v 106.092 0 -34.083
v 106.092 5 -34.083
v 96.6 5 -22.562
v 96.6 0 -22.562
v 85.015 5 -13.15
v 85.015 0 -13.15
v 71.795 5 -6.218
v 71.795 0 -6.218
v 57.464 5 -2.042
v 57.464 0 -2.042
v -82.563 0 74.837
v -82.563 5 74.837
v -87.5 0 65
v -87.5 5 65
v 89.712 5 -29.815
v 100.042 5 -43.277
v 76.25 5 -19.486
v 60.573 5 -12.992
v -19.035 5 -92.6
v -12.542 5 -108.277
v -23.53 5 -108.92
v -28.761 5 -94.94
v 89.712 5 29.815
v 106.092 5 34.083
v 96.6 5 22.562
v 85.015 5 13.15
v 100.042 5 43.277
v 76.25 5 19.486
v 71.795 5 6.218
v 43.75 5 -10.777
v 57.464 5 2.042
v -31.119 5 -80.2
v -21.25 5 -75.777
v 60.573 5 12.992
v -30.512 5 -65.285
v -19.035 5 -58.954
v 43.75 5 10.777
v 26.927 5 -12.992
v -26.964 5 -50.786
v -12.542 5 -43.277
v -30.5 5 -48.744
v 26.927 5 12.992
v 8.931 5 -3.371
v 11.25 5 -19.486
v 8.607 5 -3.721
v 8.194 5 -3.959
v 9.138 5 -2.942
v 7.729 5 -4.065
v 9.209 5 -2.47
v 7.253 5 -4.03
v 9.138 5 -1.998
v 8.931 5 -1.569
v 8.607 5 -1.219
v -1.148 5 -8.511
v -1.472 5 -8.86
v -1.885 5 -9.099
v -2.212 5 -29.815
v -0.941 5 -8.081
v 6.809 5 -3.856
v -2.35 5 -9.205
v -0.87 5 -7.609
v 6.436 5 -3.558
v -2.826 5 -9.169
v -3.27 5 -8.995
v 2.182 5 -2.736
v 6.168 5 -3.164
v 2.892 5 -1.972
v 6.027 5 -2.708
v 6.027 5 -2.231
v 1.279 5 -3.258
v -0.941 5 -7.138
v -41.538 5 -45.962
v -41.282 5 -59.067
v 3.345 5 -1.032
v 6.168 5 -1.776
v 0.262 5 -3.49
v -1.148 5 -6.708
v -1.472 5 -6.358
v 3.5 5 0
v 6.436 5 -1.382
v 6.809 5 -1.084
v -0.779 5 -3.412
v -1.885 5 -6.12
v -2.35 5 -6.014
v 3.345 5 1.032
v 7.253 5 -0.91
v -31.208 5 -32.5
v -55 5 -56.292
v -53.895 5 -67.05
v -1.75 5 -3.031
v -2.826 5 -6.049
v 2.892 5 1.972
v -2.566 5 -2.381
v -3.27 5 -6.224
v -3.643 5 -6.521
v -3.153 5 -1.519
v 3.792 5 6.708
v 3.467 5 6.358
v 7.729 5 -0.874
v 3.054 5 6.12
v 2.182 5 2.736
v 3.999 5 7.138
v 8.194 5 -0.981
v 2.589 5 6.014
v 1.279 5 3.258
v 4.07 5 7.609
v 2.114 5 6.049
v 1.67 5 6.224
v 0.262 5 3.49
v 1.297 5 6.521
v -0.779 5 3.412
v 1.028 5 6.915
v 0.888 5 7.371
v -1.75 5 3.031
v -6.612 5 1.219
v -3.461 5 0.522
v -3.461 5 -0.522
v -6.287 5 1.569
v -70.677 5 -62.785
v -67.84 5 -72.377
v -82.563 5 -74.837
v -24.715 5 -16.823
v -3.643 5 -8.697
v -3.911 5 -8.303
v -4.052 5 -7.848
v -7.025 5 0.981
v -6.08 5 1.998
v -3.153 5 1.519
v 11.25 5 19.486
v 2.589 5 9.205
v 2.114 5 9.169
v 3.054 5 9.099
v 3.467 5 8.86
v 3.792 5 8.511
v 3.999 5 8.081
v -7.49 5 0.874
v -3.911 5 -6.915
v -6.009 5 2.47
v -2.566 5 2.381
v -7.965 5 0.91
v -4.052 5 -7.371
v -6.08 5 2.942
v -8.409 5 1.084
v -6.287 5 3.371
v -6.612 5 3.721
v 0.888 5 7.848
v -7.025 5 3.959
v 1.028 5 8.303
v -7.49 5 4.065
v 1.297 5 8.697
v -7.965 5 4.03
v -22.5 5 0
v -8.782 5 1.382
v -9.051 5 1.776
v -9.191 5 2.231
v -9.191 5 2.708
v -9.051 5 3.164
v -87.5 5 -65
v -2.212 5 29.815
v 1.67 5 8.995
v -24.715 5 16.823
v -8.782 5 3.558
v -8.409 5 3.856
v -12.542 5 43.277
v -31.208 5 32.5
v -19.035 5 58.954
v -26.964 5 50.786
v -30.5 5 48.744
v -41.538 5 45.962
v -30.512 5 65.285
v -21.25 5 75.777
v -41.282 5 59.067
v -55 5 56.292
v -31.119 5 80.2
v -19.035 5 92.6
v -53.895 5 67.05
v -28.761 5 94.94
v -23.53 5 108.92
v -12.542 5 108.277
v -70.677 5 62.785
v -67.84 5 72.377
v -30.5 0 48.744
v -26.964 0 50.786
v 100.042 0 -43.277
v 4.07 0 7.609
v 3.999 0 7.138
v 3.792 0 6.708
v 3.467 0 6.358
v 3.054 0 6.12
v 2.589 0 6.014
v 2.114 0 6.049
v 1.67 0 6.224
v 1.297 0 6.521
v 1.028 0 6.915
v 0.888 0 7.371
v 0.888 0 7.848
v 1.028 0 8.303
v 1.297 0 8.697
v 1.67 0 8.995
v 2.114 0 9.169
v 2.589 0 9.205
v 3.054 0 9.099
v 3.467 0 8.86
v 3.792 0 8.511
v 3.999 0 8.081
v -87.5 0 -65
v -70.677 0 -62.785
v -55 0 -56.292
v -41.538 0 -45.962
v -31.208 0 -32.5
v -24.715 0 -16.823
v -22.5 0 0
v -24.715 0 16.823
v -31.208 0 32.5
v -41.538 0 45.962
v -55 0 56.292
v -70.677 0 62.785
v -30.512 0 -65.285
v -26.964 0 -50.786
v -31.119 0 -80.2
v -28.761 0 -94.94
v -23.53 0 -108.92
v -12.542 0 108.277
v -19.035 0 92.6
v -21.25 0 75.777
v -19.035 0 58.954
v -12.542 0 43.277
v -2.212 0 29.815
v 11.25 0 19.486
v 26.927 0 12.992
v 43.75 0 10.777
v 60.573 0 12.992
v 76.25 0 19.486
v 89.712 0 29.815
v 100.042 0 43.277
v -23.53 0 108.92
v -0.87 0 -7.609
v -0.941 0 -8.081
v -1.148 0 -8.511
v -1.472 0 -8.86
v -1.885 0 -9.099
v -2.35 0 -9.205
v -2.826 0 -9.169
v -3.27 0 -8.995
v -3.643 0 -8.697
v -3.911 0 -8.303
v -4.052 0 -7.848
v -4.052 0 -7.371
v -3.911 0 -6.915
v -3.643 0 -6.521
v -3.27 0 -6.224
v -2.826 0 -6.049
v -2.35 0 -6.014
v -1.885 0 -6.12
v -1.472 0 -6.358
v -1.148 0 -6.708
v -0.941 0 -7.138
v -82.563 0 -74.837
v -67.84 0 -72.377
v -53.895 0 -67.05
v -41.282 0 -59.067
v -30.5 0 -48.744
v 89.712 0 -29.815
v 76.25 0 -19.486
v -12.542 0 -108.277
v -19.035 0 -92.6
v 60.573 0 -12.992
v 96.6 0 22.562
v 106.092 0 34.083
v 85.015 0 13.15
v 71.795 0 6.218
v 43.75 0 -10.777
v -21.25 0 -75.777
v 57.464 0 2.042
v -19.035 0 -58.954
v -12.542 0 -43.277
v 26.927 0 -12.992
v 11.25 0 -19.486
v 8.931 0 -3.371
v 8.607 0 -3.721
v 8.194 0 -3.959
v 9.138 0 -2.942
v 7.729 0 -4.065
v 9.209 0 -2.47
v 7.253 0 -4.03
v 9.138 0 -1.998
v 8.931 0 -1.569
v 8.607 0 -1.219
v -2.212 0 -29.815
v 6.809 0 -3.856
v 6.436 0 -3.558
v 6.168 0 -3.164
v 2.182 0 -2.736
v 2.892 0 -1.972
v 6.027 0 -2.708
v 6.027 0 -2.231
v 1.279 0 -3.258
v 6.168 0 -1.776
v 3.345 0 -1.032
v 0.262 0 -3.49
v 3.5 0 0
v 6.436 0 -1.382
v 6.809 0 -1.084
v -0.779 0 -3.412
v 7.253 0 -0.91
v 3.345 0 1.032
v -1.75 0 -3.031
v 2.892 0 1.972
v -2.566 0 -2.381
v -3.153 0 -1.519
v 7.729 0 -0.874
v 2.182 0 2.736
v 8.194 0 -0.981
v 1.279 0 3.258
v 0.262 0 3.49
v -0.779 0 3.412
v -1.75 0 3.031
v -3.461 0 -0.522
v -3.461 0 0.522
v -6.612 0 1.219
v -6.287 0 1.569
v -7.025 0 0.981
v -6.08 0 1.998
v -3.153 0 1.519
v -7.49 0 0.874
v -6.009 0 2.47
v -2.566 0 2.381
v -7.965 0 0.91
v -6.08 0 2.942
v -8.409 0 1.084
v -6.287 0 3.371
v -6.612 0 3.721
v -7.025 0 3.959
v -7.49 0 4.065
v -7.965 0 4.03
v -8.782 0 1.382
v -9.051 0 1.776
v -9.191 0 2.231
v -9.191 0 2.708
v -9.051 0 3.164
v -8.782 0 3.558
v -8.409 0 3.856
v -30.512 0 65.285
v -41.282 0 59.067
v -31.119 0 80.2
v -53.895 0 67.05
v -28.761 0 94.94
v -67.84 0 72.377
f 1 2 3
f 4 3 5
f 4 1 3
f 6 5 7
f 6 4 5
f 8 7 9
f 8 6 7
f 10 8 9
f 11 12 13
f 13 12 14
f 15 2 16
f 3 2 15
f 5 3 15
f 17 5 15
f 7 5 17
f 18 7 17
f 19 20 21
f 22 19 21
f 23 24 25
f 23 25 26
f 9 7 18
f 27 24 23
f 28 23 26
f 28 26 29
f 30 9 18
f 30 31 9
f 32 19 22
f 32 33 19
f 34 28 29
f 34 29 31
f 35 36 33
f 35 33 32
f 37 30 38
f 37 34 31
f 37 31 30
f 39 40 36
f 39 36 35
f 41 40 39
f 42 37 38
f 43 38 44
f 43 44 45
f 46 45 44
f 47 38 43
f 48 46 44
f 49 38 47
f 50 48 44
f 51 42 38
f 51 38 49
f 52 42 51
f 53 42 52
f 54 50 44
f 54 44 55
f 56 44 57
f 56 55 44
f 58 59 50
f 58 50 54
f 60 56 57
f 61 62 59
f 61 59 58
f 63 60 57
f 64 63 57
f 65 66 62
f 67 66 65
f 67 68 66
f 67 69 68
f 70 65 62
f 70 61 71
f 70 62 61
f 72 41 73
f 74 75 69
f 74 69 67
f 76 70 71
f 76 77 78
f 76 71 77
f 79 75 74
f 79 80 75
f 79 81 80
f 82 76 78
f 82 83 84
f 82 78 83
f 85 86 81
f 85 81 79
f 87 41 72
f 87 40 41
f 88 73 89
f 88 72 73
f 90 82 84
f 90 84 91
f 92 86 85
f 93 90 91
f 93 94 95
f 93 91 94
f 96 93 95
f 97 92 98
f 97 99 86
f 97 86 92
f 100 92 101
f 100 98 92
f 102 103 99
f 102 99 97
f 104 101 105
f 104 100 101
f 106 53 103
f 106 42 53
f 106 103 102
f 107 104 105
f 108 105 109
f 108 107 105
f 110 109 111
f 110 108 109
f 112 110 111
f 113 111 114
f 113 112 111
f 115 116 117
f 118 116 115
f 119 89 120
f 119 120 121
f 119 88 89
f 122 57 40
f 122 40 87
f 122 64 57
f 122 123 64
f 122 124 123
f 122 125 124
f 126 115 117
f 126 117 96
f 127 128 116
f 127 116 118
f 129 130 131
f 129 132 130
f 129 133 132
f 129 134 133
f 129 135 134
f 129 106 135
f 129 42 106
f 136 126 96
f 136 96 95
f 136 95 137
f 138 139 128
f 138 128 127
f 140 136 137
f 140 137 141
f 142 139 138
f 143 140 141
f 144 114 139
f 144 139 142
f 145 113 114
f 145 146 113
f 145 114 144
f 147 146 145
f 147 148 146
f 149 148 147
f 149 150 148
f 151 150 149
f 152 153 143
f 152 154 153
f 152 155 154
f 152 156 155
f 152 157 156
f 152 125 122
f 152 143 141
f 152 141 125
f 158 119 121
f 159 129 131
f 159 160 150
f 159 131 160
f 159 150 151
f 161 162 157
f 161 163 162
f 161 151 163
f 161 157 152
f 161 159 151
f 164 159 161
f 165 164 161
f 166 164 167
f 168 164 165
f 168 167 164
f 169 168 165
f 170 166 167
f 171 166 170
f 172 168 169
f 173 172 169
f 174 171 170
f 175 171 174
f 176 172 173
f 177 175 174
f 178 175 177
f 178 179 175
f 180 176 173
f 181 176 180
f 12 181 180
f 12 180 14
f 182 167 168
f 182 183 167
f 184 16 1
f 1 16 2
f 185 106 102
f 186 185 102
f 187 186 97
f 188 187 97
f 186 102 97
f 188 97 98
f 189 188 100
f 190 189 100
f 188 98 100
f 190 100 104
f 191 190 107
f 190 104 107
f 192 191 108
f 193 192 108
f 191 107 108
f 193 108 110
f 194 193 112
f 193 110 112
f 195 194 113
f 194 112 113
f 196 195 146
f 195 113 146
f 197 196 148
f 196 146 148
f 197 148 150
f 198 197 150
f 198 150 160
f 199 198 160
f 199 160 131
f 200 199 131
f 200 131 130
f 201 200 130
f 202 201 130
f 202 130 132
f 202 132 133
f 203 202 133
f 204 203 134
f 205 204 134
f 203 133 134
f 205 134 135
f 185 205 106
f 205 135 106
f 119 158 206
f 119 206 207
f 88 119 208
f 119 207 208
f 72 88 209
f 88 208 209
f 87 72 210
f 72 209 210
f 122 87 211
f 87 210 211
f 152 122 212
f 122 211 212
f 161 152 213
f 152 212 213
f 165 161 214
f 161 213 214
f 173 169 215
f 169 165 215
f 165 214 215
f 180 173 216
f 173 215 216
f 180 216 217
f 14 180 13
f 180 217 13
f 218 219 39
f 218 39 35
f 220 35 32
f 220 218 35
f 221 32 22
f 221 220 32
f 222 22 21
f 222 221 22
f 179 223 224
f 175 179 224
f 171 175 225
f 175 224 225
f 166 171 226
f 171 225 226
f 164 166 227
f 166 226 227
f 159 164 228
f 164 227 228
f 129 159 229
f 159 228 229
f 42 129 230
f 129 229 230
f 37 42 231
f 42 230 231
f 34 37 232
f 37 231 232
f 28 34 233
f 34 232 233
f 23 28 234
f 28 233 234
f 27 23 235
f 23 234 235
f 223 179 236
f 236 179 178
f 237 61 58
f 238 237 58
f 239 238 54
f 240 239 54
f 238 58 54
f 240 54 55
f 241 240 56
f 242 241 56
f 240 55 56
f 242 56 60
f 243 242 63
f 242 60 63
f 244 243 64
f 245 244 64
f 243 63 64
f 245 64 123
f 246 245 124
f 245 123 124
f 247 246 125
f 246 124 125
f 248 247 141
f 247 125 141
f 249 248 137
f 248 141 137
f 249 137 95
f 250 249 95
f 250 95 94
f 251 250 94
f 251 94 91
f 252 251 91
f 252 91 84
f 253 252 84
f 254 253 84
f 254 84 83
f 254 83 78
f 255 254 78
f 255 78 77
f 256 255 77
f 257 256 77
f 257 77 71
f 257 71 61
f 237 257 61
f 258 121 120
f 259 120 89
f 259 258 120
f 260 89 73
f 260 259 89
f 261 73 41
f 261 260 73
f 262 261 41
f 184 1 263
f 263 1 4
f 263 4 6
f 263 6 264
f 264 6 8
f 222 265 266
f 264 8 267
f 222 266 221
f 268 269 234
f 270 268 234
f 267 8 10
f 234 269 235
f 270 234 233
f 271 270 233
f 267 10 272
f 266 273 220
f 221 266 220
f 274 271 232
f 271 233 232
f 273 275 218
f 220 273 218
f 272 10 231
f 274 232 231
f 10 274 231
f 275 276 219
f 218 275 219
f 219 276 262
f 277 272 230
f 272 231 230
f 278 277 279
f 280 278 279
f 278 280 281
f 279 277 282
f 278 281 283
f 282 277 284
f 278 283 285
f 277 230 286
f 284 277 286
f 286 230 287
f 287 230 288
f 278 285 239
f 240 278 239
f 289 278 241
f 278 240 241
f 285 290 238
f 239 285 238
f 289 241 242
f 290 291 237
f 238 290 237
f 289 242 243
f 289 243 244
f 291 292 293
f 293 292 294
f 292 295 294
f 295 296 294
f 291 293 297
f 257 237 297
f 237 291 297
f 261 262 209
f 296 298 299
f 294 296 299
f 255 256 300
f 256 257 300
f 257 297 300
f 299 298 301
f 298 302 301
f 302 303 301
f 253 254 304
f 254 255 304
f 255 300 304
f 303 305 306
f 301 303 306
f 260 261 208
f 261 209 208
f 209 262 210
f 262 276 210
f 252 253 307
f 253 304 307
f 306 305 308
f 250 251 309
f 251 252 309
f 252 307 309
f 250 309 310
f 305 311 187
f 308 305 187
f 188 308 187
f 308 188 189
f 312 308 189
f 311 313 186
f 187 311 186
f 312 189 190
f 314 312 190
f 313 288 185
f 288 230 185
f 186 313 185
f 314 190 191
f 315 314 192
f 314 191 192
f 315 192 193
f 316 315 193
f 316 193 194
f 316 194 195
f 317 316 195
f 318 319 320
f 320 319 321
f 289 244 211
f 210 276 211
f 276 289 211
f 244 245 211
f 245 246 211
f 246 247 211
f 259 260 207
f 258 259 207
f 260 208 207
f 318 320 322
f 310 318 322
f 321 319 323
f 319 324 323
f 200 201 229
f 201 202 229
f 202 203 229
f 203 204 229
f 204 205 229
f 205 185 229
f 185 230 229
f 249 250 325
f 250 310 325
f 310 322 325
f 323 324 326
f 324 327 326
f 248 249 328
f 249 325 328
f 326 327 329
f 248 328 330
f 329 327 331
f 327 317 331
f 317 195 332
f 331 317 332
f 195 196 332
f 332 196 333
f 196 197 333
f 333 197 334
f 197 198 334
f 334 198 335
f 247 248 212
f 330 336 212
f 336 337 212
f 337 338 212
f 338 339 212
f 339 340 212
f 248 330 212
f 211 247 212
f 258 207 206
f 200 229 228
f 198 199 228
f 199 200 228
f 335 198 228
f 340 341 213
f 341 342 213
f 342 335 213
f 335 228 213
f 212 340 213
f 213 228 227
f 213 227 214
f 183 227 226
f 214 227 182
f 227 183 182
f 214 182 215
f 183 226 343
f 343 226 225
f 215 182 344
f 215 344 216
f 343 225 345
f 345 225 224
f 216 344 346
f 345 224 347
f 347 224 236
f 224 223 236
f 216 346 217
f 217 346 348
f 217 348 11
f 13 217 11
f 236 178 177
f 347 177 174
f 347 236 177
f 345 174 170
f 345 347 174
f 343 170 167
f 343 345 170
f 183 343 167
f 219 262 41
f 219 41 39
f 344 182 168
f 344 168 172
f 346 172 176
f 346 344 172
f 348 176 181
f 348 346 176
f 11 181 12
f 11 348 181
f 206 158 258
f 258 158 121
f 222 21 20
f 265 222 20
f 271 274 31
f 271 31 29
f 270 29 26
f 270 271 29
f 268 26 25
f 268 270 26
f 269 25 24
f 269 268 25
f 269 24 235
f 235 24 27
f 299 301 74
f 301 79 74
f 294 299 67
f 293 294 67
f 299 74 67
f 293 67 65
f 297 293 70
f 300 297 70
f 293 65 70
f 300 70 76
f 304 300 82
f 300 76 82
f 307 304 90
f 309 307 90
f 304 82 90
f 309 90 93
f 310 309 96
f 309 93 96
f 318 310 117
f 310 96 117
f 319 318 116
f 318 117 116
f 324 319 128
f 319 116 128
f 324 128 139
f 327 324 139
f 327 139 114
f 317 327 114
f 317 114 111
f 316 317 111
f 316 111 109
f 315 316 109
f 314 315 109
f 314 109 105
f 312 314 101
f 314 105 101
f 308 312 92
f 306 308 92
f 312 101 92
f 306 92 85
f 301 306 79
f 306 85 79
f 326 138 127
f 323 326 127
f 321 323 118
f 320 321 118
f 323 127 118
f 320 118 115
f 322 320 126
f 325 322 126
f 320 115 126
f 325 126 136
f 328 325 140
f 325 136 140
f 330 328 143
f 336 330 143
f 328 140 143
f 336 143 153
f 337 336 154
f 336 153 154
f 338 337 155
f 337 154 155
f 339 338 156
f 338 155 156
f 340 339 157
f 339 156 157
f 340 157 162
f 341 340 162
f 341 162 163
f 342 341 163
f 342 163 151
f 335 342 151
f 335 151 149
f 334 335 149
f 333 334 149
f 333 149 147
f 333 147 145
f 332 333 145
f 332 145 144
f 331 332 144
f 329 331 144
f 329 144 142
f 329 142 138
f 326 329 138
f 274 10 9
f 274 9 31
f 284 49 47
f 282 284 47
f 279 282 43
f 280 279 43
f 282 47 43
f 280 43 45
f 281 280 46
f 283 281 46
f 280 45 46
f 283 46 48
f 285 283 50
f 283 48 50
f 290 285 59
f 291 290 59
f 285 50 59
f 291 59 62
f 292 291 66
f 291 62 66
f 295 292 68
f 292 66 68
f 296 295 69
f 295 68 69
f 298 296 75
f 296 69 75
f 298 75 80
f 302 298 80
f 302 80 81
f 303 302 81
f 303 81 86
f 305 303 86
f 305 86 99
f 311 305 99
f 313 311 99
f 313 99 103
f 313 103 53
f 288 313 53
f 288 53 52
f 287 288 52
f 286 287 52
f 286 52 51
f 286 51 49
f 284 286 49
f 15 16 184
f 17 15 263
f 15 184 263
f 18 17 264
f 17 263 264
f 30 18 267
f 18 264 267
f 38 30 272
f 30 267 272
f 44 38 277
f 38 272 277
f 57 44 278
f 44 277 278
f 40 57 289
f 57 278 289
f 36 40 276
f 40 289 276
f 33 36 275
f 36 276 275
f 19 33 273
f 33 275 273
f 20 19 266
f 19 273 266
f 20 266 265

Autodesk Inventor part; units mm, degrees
ref_plane "YZ Plane" through (0, 0, 0) normal (1, 0, 0) x (0, 1, 0)
ref_plane "XZ Plane" through (0, 0, 0) normal (0, 1, 0) x (-1, 0, 0)
ref_plane "XY Plane" through (0, 0, 0) normal (0, 0, 1) x (1, 0, 0)
sketch "Эскиз1" plane through (0, 0, 0) normal (0, 1, 0) x (-1, 0, 0)
  circle A0 centre (0, 0) radius 152.5
  line L0 (0, 0) -> (152.5, 0)
  circle A1 centre (87.5, 0) radius 65
  circle A2 centre (-43.75, 75.7772) radius 65
  circle A3 centre (-43.75, -75.7772) radius 65
  circle A4 centre (87.5, 0) radius 75
  circle A5 centre (-43.75, 75.7772) radius 75
  circle A6 centre (-43.75, -75.7772) radius 75
  line L1 (0, 0) -> (-76.25, 132.0689)
  line L2 (0, 0) -> (-76.25, -132.0689)
  line L3 (144.5, 48.7442) -> (30.5, -48.7442)
  line L4 (-114.4637, 100.7686) -> (26.9637, 50.7859)
  line L5 (-30.0363, -149.5128) -> (-57.4637, -2.0417)
  line L6 (30.5, -48.7442) -> (26.9637, -50.7859)
  line L7 (26.9637, 50.7859) -> (30.5, 48.7442)
  line L8 (-57.4637, -2.0417) -> (-57.4637, 2.0417)
  line L9 (87.5, -75) -> (87.5, 75)
  line L10 (21.2019, 113.2772) -> (-108.7019, 38.2772)
  line L11 (-108.7019, -38.2772) -> (21.2019, -113.2772)
  point P0 (14.0693, 24.3687)
  point P1 (-28.1386, 0)
  point P2 (14.0693, -24.3687)
  point P3 (12.5, 0)
  point P4 (22.5, 0)
  point P5 (152.5, 0)
  point P6 (-6.25, 10.8253)
  point P7 (-11.25, 19.4856)
  point P8 (-76.25, 132.0689)
  point P9 (-114.4637, 100.7686)
  point P10 (-6.25, -10.8253)
  point P11 (-11.25, -19.4856)
  point P12 (-76.25, -132.0689)
  point P13 (-30.0363, -149.5128)
  point P14 (-114.4637, -100.7686)
  point P15 (-30.0363, 149.5128)
  point P16 (144.5, -48.7442)
  point P17 (152.5, 0)
  point P18 (136.9, 42.245)
  point P19 (17.5352, 54.1181)
  point P20 (-105.0352, 97.4364)
  point P21 (-114.4637, 100.7686)
  point P22 (-57.4637, -2.0417)
  point P23 (-55.6352, -11.8731)
  point P24 (-31.8648, -139.6814)
  point P25 (-30.0363, -149.5128)
  point P26 (38.1, -42.245)
  point P27 (87.5, -65)
  point P28 (87.5, 65)
  point P29 (12.5417, 108.2772)
  point P30 (-100.0417, 43.2772)
  point P31 (-57.4637, -2.0417)
  point P32 (-100.0417, -43.2772)
  point P33 (12.5417, -108.2772)
  dimension "d0" = 305
  dimension "d1" = 130
  dimension "d2" = 0
  dimension "d5" = 360
  dimension "d7" = 150
  dimension "d10" = 360
  dimension "d16" = 360
  dimension "d18" = 0
  dimension "d21" = 360
  dimension "d25" = 360
  dimension "d48" = 360
extrude "Выдавливание1" add sketch "Эскиз1" along normal blind 5 contours L9 A4 L3 A1 | L9 A1 L0 A4 | A1 L3 A4 L0 | A5 L4 A2 L10 | A4 L0 L1 A5 L7 | L11 A3 L2 A6 | L6 A6 L2 L0 A4 | L10 A2 L1 A5 | A5 L1 A2 L4 | L11 A6 L5 A3 | L2 A6 L8 A5 L1 | L5 A6 L2 A3 picked at (58.9785, -61.9188) picked at (22.0957, 93.4205) picked at (-83.1125, -20.1174)
sketch "Эскиз4" plane through (0, 5, 0) normal (0, 1, 0) x (1, 0, 0)
  circle A0 centre (0, 0) radius 3.5
  dimension "d43" = 7
extrude "Выдавливание4" cut sketch "Эскиз4" against normal blind 140
sketch "Эскиз5" plane through (0, 5, 0) normal (0, 1, 0) x (1, 0, 0)
  circle A0 centre (0, 0) radius 3.5 projected
  arc A1 (-87.5, -65) -> (-87.5, 65) centre (-87.5, 0) ccw projected
  line L0 (-87.5, -65) -> (-87.5, -69)
  line L1 (-87.5, -65) -> (-87.5, -75) projected
  circle A2 centre (0, 0) radius 111.4327
  circle A3 centre (0, 0) radius 192.7389
  dimension "d51" = 4
extrude "Выдавливание5" cut sketch "Эскиз5" against normal through all contours A3
sketch "Эскиз6" plane through (0, 5, 0) normal (0, 1, 0) x (1, 0, 0)
  line L0 (103.5058, 41.2772) -> (100.0417, 43.2772) projected
  arc A0 (57.4637, 2.0417) -> (106.0924, 34.0829) centre (43.75, 75.7772) ccw projected
  line L1 (100.0417, 43.2772) -> (106.0924, 34.0829)
  line L2 (-87.5, 65) -> (-82.5629, 74.8373)
  line L3 (-12.5417, -108.2772) -> (-23.5296, -108.9202)
  line L4 (100.0417, -43.2772) -> (103.5058, -41.2772) projected
  line L5 (106.0924, -34.0829) -> (100.0417, -43.2772)
  line L6 (-23.5296, 108.9202) -> (-12.5417, 108.2772)
  line L7 (-82.5629, -74.8373) -> (-87.5, -65)
  arc A1 (-12.5417, 108.2772) -> (100.0417, 43.2772) centre (43.75, 75.7772) ccw projected
  arc A2 (-82.5629, 74.8373) -> (-87.5, 69) centre (0, 0) ccw projected
  line L8 (-87.5, 69) -> (-87.5, 65) projected
  arc A3 (-87.5, -65) -> (-87.5, 65) centre (-87.5, 0) ccw projected
  line L9 (-87.5, -65) -> (-87.5, -69) projected
  arc A4 (-87.5, -69) -> (-82.5629, -74.8373) centre (0, 0) ccw projected
  arc A5 (-82.5629, -74.8373) -> (-30.5, -48.7442) centre (-87.5, 0) ccw projected
  line L10 (-30.5, -48.7442) -> (-26.9637, -50.7859) projected
  arc A6 (-26.9637, -50.7859) -> (-23.5296, -108.9202) centre (43.75, -75.7772) ccw projected
  arc A7 (-23.5296, -108.9202) -> (-16.0058, -110.2772) centre (0, 0) ccw projected
  line L11 (-16.0058, -110.2772) -> (-12.5417, -108.2772) projected
  arc A8 (100.0417, -43.2772) -> (-12.5417, -108.2772) centre (43.75, -75.7772) ccw projected
  line L12 (100.0417, -43.2772) -> (103.5058, -41.2772) projected
  arc A9 (103.5058, -41.2772) -> (106.0924, -34.0829) centre (0, 0) ccw projected
  arc A10 (106.0924, -34.0829) -> (57.4637, -2.0417) centre (43.75, -75.7772) ccw projected
  line L13 (57.4637, -2.0417) -> (57.4637, 2.0417) projected
  arc A11 (57.4637, 2.0417) -> (106.0924, 34.0829) centre (43.75, 75.7772) ccw projected
  arc A12 (106.0924, 34.0829) -> (103.5058, 41.2772) centre (0, 0) ccw projected
  line L14 (103.5058, 41.2772) -> (100.0417, 43.2772) projected
  arc A13 (-12.5417, 108.2772) -> (100.0417, 43.2772) centre (43.75, 75.7772) ccw projected
  line L15 (-12.5417, 108.2772) -> (-16.0058, 110.2772) projected
  arc A14 (-16.0058, 110.2772) -> (-23.5296, 108.9202) centre (0, 0) ccw projected
  arc A15 (-23.5296, 108.9202) -> (-26.9637, 50.7859) centre (43.75, 75.7772) ccw projected
  line L16 (-26.9637, 50.7859) -> (-30.5, 48.7442) projected
  arc A16 (-30.5, 48.7442) -> (-82.5629, 74.8373) centre (-87.5, 0) ccw projected
  circle A17 centre (0, 0) radius 3.5 projected
  point P0 (-12.5417, 108.2772)
  point P1 (106.0924, 34.0829)
  dimension "d56" = 360
  dimension "d60" = 360
extrude "Выдавливание6" cut sketch "Эскиз6" against normal through all contours A12 L1 L0 | L6 A14 L15 | A9 L4 L5 | L2 L8 A2 | L11 A7 L3 | L7 A4 L9
sketch "Эскиз7" plane through (0, 5, 0) normal (0, 1, 0) x (1, 0, 0)
  circle A0 centre (7.6092, 2.4699) radius 1.6
  circle A1 centre (-7.6092, -2.4699) radius 1.6
  circle A2 centre (-2.4699, 7.6092) radius 1.6
  circle A3 centre (0, 0) radius 3.1
  circle A4 centre (2.4699, -7.6092) radius 1.6
extrude "Выдавливание7" cut sketch "Эскиз7" against normal through all contours A0 | A1 | A2 | A4
sketch "Эскиз8" plane through (0, 5, 0) normal (0, 1, 0) x (1, 0, 0)
  circle A0 centre (-2.4699, 7.6092) radius 1.6 projected
  circle A1 centre (7.6092, 2.4699) radius 1.6 projected
  circle A2 centre (-7.6092, -2.4699) radius 1.6 projected
  circle A3 centre (2.4699, -7.6092) radius 1.6 projected
  line L0 (-23.5296, -108.9202) -> (-12.5417, -108.2772) projected
  arc A4 (100.0417, -43.2772) -> (-12.5417, -108.2772) centre (43.75, -75.7772) ccw projected
  line L1 (100.0417, -43.2772) -> (106.0924, -34.0829) projected
  arc A5 (106.0924, -34.0829) -> (57.4637, -2.0417) centre (43.75, -75.7772) ccw projected
  line L2 (57.4637, -2.0417) -> (57.4637, 2.0417) projected
  arc A6 (57.4637, 2.0417) -> (106.0924, 34.0829) centre (43.75, 75.7772) ccw projected
  line L3 (106.0924, 34.0829) -> (100.0417, 43.2772) projected
  arc A7 (-12.5417, 108.2772) -> (100.0417, 43.2772) centre (43.75, 75.7772) ccw projected
  line L4 (-12.5417, 108.2772) -> (-23.5296, 108.9202) projected
  arc A8 (-23.5296, 108.9202) -> (-26.9637, 50.7859) centre (43.75, 75.7772) ccw projected
  line L5 (-26.9637, 50.7859) -> (-30.5, 48.7442) projected
  arc A9 (-30.5, 48.7442) -> (-82.5629, 74.8373) centre (-87.5, 0) ccw projected
  line L6 (-82.5629, 74.8373) -> (-87.5, 65) projected
  arc A10 (-87.5, -65) -> (-87.5, 65) centre (-87.5, 0) ccw projected
  line L7 (-87.5, -65) -> (-82.5629, -74.8373) projected
  arc A11 (-82.5629, -74.8373) -> (-30.5, -48.7442) centre (-87.5, 0) ccw projected
  line L8 (-30.5, -48.7442) -> (-26.9637, -50.7859) projected
  arc A12 (-26.9637, -50.7859) -> (-23.5296, -108.9202) centre (43.75, -75.7772) ccw projected
  circle A13 centre (0, 0) radius 3.5 projected
properties part number "сюрикен 2 dthcbz"
